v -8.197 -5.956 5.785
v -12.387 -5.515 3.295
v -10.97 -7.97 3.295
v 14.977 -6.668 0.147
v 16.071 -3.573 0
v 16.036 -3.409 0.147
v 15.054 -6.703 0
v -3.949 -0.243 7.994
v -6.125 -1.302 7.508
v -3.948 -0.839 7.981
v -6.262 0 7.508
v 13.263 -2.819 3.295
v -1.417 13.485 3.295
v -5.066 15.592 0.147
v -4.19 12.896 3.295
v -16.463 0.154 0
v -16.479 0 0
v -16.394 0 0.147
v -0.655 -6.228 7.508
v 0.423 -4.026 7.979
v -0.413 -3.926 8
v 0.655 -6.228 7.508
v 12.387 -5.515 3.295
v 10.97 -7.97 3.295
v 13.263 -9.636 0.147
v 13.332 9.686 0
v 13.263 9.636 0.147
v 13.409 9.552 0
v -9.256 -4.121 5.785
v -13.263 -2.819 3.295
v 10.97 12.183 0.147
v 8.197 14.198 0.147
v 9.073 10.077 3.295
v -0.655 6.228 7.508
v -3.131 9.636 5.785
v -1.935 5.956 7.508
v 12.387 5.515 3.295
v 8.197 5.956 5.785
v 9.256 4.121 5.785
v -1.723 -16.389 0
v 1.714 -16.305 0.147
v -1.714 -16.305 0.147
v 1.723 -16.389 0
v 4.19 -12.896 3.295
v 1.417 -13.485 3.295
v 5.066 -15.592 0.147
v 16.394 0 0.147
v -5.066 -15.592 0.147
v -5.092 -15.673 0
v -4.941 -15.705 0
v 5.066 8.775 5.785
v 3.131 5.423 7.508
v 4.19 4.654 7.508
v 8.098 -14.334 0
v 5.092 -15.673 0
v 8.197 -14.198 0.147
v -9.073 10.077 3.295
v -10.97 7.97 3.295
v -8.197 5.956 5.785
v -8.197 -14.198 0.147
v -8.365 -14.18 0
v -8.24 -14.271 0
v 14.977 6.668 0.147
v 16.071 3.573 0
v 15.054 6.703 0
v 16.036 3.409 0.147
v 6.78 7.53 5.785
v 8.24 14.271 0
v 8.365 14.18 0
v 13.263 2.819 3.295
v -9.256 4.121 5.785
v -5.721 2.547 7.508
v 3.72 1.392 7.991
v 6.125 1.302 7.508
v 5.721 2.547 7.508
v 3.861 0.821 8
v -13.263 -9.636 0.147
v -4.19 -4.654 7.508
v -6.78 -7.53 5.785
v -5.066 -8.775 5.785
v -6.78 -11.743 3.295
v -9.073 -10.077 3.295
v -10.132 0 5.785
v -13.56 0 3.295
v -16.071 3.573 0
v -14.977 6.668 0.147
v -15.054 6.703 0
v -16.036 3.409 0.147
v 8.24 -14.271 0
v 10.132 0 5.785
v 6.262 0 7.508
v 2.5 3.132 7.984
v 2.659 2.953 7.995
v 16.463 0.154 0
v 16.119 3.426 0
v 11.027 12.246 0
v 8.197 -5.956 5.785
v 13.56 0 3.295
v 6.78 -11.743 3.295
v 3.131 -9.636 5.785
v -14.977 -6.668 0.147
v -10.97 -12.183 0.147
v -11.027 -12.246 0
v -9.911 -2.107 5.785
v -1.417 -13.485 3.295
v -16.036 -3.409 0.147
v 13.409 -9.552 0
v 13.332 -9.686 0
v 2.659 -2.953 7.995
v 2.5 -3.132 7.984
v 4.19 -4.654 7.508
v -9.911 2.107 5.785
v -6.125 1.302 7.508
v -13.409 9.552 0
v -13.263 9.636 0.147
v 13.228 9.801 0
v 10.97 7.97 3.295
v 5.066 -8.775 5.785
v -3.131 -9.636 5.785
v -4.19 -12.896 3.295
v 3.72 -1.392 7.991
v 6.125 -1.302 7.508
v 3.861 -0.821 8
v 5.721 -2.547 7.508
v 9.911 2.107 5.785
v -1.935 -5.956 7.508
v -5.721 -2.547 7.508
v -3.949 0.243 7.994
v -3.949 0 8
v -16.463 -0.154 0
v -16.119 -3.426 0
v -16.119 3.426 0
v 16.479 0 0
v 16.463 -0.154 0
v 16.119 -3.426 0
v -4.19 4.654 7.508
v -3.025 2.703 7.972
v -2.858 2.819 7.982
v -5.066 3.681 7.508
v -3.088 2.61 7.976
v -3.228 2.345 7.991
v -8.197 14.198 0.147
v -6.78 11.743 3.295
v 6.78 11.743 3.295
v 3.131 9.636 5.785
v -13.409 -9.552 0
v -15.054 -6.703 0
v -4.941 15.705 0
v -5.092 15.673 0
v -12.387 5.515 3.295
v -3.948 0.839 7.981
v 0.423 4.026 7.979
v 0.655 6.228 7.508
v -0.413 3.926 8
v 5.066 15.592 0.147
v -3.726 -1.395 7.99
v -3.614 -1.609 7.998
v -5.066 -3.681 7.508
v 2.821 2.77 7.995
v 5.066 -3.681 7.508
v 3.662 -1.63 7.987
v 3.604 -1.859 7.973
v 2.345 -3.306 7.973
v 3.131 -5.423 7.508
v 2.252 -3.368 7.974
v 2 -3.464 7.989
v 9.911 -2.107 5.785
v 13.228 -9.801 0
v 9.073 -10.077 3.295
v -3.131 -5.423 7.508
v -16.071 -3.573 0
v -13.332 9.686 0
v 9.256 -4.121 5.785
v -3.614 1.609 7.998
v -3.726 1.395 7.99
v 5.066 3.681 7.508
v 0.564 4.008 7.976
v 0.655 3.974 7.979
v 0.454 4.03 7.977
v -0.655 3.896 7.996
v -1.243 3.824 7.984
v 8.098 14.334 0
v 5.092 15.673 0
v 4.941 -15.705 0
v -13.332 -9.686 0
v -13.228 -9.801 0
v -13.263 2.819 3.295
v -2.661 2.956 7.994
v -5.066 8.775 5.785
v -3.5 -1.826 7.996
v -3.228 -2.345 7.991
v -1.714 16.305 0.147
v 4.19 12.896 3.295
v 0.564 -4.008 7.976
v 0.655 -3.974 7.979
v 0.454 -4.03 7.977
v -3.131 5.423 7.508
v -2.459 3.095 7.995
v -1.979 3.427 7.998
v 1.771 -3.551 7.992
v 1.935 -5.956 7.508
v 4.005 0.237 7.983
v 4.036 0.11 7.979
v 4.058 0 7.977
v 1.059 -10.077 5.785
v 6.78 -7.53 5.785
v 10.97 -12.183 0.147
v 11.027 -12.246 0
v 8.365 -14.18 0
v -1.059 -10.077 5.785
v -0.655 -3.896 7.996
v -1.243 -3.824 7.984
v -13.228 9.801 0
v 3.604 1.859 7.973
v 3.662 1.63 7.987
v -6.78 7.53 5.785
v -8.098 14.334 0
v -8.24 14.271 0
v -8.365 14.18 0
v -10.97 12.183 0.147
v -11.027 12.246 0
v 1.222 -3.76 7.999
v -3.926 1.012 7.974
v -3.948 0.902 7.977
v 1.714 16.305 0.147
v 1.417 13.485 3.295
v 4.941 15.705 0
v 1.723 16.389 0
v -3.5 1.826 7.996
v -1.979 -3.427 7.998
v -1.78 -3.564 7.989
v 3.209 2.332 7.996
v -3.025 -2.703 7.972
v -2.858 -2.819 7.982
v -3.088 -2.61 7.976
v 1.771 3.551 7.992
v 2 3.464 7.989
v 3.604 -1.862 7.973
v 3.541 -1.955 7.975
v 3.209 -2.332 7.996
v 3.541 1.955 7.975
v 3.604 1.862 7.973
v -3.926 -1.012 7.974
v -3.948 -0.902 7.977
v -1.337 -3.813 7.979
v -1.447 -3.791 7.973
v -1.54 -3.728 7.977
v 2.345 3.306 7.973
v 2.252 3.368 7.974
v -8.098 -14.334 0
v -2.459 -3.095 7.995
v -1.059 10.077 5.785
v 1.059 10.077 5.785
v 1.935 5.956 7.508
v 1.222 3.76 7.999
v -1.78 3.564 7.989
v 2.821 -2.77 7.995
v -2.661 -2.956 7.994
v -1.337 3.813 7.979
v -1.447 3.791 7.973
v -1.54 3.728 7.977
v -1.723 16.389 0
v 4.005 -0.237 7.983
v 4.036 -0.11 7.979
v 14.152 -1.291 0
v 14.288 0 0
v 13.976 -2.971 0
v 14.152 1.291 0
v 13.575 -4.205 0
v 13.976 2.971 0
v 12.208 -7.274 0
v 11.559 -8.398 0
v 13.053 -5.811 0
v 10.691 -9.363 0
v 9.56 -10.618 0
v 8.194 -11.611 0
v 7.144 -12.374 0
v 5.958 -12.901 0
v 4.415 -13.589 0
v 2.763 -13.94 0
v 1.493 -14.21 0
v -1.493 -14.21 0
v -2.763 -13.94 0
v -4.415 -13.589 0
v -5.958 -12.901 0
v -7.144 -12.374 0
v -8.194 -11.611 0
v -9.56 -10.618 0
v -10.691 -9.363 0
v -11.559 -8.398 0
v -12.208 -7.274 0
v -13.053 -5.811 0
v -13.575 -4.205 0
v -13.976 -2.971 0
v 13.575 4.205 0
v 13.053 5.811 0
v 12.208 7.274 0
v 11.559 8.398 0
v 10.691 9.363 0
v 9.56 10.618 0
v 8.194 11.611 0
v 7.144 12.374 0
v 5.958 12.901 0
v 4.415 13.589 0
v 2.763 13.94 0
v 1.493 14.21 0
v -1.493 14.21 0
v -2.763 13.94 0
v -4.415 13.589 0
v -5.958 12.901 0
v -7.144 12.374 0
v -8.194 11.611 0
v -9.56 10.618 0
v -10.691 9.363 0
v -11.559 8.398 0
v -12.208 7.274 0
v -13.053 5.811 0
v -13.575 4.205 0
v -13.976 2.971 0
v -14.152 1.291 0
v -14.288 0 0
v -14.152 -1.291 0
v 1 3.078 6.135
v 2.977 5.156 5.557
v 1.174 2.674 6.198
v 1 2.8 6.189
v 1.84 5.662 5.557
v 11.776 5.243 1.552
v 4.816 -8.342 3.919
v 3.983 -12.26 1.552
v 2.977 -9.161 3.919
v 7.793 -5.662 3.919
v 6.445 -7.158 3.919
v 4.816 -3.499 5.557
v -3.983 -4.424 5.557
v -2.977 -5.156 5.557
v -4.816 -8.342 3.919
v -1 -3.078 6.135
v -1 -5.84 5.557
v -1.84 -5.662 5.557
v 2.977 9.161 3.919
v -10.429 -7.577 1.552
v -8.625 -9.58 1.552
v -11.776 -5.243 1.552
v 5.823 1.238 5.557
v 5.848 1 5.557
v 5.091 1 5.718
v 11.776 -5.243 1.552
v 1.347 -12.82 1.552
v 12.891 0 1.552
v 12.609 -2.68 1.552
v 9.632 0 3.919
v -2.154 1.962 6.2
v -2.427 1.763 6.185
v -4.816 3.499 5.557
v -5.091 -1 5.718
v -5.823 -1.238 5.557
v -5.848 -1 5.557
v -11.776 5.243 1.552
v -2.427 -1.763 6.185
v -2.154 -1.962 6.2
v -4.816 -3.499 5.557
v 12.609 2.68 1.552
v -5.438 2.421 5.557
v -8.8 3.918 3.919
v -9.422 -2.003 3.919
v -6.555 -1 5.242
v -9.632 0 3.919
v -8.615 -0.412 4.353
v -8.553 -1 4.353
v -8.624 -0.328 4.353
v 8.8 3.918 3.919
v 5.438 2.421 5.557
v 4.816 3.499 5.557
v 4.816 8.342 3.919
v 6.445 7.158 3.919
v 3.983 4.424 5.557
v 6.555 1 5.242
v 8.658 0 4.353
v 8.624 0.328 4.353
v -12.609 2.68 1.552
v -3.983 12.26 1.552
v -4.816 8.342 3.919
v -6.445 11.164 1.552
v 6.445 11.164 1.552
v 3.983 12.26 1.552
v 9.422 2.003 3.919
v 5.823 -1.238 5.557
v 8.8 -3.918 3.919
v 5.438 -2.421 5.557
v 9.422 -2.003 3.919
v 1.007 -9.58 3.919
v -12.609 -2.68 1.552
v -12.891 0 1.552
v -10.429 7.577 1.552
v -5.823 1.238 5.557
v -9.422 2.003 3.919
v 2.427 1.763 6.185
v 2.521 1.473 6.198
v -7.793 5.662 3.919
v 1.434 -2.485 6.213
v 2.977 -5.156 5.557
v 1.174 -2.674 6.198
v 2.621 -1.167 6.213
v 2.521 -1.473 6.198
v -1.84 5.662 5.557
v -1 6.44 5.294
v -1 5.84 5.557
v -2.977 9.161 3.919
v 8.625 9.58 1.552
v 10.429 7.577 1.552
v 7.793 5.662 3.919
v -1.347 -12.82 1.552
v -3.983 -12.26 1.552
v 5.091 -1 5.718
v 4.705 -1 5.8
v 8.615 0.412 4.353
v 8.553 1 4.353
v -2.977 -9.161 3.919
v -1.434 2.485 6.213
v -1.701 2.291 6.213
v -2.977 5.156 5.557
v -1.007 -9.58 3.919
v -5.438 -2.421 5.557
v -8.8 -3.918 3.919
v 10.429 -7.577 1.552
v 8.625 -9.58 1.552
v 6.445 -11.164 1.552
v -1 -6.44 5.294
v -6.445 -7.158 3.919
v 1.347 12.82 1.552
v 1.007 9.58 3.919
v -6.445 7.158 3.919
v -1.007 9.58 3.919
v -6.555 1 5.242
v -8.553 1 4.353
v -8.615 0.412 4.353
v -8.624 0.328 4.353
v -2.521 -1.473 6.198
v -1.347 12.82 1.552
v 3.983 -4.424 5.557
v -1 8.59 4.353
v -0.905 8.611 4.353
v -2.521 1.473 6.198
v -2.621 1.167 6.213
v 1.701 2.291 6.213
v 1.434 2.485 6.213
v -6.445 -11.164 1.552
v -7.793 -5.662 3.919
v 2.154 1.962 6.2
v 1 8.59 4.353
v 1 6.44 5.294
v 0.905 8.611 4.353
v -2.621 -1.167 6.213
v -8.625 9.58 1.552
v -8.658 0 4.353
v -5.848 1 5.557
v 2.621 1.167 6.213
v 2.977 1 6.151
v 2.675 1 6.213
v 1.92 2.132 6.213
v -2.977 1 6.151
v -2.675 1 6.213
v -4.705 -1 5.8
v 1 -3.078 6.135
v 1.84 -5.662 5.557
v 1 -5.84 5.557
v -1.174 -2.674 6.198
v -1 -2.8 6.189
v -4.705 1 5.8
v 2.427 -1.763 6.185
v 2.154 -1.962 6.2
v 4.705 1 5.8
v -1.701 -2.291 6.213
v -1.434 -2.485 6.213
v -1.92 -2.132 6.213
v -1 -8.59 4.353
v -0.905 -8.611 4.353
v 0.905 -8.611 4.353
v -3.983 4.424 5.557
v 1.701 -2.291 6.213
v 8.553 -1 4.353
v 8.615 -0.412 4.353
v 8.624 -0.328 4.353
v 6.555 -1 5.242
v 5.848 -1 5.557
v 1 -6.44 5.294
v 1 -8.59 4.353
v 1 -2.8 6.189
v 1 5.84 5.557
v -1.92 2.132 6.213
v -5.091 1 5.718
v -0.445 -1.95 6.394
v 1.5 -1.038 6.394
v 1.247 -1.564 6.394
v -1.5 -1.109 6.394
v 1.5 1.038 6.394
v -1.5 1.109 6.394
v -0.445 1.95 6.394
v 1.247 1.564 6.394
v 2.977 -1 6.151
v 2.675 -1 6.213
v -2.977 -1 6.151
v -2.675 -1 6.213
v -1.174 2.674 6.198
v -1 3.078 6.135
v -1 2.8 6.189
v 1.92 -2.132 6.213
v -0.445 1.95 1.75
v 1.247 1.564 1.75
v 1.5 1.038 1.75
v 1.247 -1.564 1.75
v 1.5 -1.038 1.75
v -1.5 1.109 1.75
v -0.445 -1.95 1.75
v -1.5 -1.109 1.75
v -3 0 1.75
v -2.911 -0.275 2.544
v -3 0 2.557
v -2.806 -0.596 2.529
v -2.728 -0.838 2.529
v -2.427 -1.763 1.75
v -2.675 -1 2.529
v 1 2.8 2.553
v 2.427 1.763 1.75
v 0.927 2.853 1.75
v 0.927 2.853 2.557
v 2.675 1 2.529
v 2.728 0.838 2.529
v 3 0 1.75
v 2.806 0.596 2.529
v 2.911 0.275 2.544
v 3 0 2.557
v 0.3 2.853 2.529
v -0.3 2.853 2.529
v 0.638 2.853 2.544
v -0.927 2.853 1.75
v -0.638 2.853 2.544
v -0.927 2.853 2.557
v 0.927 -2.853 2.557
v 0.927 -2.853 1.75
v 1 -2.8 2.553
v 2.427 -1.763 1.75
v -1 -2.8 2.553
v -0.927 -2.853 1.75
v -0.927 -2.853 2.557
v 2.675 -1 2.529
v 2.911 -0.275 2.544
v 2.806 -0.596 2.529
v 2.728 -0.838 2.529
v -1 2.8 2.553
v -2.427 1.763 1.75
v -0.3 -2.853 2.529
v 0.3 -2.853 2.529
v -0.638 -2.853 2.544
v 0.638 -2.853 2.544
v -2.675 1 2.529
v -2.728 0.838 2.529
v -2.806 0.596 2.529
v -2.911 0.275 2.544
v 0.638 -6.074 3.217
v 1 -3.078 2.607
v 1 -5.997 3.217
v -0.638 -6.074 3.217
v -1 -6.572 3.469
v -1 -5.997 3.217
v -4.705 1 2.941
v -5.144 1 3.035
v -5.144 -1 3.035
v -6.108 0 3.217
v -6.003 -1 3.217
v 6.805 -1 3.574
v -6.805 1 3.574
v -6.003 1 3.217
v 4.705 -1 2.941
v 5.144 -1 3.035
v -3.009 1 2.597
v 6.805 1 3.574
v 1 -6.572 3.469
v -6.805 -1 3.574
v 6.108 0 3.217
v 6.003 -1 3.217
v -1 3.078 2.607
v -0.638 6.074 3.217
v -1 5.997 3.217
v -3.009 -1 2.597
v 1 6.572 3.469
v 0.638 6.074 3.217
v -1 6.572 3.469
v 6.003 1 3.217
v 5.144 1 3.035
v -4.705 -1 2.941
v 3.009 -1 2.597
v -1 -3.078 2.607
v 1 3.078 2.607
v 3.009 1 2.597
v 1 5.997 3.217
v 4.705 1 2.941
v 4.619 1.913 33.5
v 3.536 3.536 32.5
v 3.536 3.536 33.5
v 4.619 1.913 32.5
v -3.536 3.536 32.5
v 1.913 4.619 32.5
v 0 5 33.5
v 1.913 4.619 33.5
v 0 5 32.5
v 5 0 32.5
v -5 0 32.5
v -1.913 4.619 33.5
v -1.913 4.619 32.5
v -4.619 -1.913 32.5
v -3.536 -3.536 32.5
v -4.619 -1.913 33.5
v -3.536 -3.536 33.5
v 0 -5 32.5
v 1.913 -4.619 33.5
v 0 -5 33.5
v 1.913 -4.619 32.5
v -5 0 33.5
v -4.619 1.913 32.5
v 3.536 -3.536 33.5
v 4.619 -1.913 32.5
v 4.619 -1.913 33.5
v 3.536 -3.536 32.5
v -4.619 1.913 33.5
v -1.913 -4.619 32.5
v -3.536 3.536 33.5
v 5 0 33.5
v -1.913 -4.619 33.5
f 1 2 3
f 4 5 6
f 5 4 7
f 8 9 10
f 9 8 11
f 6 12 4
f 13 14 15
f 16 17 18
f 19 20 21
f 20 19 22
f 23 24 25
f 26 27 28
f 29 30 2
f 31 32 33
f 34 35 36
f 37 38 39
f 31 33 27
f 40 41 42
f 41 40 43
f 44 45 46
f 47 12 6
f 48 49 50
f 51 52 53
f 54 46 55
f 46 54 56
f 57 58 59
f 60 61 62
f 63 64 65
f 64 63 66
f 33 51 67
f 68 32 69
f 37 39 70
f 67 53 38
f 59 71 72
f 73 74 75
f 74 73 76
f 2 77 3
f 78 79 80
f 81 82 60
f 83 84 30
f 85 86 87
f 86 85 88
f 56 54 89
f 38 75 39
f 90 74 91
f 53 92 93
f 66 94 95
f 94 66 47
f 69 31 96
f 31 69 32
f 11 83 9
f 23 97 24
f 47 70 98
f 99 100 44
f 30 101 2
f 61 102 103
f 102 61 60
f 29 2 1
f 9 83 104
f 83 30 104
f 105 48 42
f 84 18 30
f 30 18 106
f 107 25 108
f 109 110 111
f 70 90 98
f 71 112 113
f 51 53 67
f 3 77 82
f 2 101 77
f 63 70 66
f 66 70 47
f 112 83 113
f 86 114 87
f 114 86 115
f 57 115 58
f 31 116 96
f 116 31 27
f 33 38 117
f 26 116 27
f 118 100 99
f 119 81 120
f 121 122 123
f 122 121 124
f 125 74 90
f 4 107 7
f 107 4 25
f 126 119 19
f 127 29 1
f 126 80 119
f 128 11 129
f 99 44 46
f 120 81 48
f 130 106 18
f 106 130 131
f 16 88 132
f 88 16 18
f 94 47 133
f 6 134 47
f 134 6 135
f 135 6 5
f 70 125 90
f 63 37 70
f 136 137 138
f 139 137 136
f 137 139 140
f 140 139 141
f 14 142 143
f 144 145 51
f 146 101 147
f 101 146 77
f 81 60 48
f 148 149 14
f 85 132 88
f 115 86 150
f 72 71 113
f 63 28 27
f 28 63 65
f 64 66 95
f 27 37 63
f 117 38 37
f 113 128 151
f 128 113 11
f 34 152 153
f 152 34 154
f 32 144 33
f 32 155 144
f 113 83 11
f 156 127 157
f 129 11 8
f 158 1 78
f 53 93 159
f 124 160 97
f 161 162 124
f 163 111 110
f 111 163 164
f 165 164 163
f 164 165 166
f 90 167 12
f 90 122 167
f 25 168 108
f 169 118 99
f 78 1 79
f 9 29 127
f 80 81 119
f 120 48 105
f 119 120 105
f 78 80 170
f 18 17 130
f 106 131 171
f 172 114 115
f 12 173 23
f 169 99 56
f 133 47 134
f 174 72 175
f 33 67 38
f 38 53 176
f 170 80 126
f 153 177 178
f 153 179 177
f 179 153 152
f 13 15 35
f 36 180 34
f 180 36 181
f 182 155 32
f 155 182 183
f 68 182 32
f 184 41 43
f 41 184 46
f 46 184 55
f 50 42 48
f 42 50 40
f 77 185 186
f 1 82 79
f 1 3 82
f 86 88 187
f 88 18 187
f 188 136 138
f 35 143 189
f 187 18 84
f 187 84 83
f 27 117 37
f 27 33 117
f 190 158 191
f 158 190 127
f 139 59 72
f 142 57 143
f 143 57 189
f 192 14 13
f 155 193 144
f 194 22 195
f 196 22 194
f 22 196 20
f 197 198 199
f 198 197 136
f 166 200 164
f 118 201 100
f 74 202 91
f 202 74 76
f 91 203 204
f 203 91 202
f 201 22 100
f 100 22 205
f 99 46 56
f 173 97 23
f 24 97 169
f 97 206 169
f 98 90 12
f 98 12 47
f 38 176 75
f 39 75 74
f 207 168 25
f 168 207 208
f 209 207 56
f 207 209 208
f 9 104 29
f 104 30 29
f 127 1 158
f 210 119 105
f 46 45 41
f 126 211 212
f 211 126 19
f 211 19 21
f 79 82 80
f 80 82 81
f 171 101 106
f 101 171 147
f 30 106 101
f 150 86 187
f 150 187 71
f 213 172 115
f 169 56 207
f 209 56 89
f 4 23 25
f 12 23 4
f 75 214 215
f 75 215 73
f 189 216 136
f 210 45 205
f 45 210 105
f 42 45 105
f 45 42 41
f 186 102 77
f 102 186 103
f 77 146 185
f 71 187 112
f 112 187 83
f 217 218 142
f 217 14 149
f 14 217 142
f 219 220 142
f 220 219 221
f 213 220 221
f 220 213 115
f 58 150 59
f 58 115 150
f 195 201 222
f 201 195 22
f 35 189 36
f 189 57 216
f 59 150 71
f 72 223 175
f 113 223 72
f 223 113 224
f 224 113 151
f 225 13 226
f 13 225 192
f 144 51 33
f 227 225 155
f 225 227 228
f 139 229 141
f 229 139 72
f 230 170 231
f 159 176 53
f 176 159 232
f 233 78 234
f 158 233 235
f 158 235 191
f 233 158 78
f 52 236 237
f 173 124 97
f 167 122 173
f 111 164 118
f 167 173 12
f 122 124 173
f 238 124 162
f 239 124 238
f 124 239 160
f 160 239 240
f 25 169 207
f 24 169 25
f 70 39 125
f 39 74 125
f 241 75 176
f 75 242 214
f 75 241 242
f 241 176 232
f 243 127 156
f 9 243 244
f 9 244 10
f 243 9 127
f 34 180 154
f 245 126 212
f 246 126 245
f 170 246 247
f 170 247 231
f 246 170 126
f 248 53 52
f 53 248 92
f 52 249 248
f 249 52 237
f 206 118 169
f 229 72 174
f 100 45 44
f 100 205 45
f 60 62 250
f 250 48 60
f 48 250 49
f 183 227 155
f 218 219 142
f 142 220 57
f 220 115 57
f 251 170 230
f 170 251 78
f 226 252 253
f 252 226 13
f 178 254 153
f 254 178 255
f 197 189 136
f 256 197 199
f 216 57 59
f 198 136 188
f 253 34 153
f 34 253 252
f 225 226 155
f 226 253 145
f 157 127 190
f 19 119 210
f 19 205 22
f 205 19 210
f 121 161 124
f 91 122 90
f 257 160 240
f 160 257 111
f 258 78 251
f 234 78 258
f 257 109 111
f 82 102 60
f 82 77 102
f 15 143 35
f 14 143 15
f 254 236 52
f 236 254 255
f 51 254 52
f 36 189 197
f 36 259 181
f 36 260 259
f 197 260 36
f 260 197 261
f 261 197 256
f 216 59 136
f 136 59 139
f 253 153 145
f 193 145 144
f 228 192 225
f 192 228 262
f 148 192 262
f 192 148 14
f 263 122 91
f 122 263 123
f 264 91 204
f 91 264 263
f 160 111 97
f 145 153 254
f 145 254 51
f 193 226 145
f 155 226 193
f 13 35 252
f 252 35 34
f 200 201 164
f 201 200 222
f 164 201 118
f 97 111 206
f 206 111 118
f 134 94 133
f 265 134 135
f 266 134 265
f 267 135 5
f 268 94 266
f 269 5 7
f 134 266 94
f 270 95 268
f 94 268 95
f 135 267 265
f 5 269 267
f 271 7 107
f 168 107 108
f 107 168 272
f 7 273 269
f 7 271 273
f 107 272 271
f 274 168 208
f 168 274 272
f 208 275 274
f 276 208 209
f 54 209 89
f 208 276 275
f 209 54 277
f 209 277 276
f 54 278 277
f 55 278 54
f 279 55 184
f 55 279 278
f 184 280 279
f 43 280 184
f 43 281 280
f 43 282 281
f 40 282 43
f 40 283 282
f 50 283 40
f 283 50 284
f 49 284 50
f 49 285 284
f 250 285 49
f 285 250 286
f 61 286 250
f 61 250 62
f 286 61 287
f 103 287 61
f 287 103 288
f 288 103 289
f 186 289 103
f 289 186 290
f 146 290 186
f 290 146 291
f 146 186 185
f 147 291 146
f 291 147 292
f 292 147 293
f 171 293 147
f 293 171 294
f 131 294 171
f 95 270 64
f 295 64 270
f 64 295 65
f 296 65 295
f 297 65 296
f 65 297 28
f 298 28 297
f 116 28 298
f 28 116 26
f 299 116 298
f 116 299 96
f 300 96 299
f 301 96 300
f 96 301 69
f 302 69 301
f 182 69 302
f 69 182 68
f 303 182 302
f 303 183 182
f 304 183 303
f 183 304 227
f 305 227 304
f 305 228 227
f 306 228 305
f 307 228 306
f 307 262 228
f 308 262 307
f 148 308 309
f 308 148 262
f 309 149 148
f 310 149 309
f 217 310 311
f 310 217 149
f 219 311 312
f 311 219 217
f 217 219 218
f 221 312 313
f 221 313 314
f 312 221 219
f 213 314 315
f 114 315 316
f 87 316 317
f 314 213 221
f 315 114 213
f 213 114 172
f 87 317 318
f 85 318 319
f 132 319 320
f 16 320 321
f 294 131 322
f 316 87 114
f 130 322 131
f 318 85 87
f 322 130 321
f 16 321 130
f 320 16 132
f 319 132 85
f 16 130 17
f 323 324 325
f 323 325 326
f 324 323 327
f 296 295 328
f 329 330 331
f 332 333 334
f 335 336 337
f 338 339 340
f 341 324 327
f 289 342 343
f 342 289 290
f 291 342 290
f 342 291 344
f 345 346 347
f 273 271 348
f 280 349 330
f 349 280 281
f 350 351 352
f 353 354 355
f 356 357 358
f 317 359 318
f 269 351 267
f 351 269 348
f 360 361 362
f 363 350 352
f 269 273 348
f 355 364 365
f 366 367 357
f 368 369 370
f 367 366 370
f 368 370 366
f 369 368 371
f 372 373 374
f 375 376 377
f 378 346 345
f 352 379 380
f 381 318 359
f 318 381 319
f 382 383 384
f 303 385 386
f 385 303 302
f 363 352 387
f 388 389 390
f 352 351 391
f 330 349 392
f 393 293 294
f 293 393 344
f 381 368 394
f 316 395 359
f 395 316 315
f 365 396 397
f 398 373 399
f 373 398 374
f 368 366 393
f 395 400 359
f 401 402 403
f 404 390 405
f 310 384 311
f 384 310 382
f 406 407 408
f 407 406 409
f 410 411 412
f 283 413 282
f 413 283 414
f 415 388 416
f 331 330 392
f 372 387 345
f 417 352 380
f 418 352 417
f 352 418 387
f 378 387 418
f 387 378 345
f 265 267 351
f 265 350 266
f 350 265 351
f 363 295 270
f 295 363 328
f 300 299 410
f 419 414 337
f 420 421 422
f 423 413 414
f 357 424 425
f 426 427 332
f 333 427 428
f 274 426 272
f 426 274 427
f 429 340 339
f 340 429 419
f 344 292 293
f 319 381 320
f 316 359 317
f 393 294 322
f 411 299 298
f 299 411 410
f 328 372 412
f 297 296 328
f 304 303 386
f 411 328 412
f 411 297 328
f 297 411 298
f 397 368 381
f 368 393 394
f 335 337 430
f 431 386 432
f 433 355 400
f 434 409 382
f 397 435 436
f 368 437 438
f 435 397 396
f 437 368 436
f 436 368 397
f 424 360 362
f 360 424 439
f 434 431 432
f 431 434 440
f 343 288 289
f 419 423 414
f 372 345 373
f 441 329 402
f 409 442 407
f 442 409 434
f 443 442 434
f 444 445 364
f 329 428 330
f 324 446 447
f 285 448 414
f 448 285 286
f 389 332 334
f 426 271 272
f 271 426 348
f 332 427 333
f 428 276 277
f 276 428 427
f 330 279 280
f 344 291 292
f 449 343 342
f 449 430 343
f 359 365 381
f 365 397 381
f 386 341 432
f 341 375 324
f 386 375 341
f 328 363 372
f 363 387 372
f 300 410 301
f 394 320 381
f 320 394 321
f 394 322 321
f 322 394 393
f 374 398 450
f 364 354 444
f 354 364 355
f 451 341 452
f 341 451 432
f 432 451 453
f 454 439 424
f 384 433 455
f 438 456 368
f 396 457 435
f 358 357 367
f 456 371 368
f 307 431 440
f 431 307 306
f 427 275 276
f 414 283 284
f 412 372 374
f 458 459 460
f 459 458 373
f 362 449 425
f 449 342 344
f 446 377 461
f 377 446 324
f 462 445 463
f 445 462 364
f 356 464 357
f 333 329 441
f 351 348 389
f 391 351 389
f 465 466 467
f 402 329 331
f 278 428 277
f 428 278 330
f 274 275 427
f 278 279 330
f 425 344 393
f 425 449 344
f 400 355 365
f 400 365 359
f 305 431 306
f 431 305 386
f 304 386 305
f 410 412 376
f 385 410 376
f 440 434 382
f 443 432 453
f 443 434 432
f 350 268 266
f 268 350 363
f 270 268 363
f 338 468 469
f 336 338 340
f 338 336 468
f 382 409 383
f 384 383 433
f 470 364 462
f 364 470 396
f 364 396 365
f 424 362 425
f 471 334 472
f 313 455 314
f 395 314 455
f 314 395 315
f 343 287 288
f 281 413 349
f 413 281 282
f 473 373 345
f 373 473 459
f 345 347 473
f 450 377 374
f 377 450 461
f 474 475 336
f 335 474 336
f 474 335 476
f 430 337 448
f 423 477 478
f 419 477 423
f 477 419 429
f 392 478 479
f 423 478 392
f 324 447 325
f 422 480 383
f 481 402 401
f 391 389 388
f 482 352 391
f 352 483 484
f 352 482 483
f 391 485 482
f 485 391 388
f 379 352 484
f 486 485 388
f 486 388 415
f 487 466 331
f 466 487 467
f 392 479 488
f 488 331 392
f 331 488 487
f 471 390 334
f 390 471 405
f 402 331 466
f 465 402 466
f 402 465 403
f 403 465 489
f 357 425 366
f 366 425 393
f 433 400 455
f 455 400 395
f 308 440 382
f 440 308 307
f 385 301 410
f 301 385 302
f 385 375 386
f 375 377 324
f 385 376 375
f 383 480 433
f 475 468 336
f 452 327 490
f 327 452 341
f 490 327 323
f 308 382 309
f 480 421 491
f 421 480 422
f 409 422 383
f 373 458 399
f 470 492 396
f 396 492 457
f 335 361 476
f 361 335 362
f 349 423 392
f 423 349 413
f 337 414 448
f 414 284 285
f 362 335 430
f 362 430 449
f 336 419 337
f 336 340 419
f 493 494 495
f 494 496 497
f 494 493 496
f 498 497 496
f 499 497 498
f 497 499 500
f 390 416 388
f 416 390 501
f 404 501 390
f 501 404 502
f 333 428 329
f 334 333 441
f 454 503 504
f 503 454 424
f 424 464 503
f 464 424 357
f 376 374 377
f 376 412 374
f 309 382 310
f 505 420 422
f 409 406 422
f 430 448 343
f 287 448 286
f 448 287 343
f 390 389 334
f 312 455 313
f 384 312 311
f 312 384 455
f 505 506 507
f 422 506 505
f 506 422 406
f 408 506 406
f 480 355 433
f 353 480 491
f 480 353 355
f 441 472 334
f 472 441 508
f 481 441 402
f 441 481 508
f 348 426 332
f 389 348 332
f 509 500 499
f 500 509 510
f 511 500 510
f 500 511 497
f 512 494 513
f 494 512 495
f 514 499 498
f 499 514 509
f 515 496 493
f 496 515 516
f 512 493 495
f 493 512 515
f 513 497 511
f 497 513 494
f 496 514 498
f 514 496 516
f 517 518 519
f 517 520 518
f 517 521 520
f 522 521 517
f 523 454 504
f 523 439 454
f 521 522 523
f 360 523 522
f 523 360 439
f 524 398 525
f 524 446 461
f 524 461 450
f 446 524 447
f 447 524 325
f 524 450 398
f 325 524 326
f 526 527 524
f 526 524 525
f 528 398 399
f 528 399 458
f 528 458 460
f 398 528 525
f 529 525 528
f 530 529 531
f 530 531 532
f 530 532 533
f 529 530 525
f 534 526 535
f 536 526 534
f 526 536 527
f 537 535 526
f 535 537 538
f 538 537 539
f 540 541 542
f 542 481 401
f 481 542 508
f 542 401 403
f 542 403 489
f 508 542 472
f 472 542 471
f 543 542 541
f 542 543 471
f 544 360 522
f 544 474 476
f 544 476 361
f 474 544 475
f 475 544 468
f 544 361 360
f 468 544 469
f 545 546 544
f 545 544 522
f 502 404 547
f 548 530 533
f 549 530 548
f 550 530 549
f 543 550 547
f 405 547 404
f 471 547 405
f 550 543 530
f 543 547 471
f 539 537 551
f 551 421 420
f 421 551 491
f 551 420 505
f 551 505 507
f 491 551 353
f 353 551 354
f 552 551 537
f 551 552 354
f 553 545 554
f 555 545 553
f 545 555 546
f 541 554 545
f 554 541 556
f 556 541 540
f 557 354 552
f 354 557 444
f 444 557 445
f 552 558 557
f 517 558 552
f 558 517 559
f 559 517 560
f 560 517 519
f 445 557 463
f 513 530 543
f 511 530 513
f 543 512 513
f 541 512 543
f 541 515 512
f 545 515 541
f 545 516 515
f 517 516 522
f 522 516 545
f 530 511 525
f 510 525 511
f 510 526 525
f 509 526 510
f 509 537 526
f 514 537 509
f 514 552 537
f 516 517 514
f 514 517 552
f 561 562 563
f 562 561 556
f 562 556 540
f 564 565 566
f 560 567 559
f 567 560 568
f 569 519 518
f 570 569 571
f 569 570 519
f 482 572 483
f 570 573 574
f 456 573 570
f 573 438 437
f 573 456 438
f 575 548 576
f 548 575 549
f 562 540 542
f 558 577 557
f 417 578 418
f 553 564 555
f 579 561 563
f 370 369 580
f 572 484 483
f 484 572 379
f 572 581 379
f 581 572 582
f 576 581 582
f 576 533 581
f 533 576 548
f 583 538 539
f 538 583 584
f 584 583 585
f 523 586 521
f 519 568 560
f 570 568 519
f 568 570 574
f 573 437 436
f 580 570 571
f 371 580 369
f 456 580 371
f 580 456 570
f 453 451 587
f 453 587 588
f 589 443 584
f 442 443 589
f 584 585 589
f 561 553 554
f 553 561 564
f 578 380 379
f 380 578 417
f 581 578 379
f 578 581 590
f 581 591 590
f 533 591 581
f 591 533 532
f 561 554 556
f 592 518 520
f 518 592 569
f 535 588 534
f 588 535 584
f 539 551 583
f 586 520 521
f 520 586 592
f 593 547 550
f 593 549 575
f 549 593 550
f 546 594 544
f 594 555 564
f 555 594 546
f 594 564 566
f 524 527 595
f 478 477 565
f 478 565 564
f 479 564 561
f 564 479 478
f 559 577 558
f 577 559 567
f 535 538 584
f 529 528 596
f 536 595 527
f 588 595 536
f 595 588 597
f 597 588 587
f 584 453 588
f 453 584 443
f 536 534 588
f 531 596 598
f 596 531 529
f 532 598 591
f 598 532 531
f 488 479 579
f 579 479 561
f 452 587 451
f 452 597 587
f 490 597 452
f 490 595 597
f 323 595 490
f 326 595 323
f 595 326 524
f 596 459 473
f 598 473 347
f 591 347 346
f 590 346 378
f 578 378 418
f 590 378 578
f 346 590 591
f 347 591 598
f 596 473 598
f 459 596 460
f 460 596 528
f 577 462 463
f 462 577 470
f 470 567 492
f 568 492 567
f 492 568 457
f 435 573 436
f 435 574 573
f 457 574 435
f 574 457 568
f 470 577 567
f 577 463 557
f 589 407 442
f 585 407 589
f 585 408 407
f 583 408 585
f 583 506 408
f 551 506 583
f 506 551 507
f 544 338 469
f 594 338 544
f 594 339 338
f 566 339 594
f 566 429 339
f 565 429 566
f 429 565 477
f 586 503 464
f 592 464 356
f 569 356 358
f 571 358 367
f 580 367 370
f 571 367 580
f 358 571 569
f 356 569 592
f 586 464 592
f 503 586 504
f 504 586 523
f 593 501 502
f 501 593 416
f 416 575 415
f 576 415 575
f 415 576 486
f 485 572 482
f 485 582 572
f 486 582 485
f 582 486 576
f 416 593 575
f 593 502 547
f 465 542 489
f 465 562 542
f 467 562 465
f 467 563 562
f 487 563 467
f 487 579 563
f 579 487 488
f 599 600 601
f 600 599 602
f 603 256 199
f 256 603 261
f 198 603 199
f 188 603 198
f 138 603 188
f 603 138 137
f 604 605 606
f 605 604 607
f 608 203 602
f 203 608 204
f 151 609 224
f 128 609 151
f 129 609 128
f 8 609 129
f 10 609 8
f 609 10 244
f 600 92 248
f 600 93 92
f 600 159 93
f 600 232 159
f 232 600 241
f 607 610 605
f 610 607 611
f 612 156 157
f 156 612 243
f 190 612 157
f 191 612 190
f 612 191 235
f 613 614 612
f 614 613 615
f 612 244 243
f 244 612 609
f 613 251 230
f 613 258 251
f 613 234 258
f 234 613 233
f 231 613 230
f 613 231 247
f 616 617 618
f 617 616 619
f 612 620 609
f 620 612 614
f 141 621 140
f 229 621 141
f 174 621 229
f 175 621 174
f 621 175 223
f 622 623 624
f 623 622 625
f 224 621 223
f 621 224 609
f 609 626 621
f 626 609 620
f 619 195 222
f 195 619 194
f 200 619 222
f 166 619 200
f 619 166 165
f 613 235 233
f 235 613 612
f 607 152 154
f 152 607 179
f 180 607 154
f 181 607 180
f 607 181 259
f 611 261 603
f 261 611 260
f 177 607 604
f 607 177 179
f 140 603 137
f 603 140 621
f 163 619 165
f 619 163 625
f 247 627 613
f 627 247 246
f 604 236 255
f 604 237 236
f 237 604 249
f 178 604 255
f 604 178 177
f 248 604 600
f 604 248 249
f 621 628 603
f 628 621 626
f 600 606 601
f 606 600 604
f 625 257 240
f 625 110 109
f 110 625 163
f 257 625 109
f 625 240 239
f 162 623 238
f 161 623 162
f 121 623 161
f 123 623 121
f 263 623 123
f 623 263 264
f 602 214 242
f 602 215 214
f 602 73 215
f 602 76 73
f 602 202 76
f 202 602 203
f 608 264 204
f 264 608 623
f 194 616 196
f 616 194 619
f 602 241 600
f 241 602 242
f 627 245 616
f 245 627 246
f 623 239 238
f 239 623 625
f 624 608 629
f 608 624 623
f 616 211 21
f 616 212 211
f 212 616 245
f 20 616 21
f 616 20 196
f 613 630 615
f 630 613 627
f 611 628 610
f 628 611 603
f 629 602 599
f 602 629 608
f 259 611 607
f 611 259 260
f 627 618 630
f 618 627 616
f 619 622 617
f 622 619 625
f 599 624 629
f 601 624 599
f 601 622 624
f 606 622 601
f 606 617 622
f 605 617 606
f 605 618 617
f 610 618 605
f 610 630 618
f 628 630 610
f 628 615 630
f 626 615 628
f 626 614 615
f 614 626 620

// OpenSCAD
customStick();
/*[Top of Stick]*/
stickHeight=25;
stickDiameterBottom=8;
stickDiameterTop=10;
/*[Measurement from Controller]*/
//If remove the stick from the controller, there is a hemisphere, if you set this hemisphere flat on a piece of paper this is the radius of the circle touching the paper
radiusOfCapCrossection=10;
//This is the height of the hemisphere above the paper
heightOfCap=8.5;
wallThickness=1;
pegMinorAxis=3;
pegMajorAxis=4;
pegDepth=4.75;







/*[calculation Block]*/
radiusOfSphereForStick=(radiusOfCapCrossection*radiusOfCapCrossection+heightOfCap*heightOfCap)/heightOfCap;

module customStick(){
	union(){
		difference(){
			translate([0,0,heightOfCap-radiusOfSphereForStick])sphere(radiusOfSphereForStick);
			translate([-2*radiusOfSphereForStick,-2*radiusOfSphereForStick,-2*radiusOfSphereForStick])cube([4*radiusOfSphereForStick,4*radiusOfSphereForStick,2*radiusOfSphereForStick]);
			translate([0,0,heightOfCap-wallThickness-radiusOfSphereForStick])sphere(radiusOfSphereForStick-wallThickness);
		}
		difference(){
			translate([0,0,heightOfCap-2*wallThickness-pegDepth])cylinder(r=pegMajorAxis/2+wallThickness,h=pegDepth);
			difference(){
				
				cylinder(r=pegMajorAxis/2,h=heightOfCap-wallThickness);
				translate([pegMinorAxis/2,-pegMajorAxis/2,0])cube([pegMinorAxis,pegMajorAxis,heightOfCap]);
				rotate([0,0,180])translate([pegMinorAxis/2,-pegMajorAxis/2,0])cube([pegMinorAxis,pegMajorAxis,heightOfCap]);

			}
		}
		hull(){
			translate([0,0,stickHeight+heightOfCap-wallThickness])cylinder(r=stickDiameterTop/2,h=wallThickness);
			difference(){
				cylinder(r=stickDiameterBottom/2,h=stickHeight+heightOfCap);
				translate([0,0,heightOfCap-wallThickness-radiusOfSphereForStick])sphere(radiusOfSphereForStick-.5*wallThickness);
			}
		}
		difference(){
			intersection(){
				translate([0,0,heightOfCap-wallThickness-radiusOfSphereForStick])sphere(radiusOfSphereForStick-.5*wallThickness);
translate([0,0,heightOfCap-2*wallThickness-pegDepth+radiusOfSphereForStick])sphere(radiusOfSphereForStick-.5*wallThickness);
			}
			cylinder(r=pegMajorAxis/2,h=heightOfCap-wallThickness);
			translate([wallThickness,wallThickness,0])cube(radiusOfSphereForStick);	
			rotate([0,0,90])translate([wallThickness,wallThickness,0])cube(radiusOfSphereForStick);
			rotate([0,0,180])translate([wallThickness,wallThickness,0])cube(radiusOfSphereForStick);
			rotate([0,0,270])translate([wallThickness,wallThickness,0])cube(radiusOfSphereForStick);
		}
	}
}
